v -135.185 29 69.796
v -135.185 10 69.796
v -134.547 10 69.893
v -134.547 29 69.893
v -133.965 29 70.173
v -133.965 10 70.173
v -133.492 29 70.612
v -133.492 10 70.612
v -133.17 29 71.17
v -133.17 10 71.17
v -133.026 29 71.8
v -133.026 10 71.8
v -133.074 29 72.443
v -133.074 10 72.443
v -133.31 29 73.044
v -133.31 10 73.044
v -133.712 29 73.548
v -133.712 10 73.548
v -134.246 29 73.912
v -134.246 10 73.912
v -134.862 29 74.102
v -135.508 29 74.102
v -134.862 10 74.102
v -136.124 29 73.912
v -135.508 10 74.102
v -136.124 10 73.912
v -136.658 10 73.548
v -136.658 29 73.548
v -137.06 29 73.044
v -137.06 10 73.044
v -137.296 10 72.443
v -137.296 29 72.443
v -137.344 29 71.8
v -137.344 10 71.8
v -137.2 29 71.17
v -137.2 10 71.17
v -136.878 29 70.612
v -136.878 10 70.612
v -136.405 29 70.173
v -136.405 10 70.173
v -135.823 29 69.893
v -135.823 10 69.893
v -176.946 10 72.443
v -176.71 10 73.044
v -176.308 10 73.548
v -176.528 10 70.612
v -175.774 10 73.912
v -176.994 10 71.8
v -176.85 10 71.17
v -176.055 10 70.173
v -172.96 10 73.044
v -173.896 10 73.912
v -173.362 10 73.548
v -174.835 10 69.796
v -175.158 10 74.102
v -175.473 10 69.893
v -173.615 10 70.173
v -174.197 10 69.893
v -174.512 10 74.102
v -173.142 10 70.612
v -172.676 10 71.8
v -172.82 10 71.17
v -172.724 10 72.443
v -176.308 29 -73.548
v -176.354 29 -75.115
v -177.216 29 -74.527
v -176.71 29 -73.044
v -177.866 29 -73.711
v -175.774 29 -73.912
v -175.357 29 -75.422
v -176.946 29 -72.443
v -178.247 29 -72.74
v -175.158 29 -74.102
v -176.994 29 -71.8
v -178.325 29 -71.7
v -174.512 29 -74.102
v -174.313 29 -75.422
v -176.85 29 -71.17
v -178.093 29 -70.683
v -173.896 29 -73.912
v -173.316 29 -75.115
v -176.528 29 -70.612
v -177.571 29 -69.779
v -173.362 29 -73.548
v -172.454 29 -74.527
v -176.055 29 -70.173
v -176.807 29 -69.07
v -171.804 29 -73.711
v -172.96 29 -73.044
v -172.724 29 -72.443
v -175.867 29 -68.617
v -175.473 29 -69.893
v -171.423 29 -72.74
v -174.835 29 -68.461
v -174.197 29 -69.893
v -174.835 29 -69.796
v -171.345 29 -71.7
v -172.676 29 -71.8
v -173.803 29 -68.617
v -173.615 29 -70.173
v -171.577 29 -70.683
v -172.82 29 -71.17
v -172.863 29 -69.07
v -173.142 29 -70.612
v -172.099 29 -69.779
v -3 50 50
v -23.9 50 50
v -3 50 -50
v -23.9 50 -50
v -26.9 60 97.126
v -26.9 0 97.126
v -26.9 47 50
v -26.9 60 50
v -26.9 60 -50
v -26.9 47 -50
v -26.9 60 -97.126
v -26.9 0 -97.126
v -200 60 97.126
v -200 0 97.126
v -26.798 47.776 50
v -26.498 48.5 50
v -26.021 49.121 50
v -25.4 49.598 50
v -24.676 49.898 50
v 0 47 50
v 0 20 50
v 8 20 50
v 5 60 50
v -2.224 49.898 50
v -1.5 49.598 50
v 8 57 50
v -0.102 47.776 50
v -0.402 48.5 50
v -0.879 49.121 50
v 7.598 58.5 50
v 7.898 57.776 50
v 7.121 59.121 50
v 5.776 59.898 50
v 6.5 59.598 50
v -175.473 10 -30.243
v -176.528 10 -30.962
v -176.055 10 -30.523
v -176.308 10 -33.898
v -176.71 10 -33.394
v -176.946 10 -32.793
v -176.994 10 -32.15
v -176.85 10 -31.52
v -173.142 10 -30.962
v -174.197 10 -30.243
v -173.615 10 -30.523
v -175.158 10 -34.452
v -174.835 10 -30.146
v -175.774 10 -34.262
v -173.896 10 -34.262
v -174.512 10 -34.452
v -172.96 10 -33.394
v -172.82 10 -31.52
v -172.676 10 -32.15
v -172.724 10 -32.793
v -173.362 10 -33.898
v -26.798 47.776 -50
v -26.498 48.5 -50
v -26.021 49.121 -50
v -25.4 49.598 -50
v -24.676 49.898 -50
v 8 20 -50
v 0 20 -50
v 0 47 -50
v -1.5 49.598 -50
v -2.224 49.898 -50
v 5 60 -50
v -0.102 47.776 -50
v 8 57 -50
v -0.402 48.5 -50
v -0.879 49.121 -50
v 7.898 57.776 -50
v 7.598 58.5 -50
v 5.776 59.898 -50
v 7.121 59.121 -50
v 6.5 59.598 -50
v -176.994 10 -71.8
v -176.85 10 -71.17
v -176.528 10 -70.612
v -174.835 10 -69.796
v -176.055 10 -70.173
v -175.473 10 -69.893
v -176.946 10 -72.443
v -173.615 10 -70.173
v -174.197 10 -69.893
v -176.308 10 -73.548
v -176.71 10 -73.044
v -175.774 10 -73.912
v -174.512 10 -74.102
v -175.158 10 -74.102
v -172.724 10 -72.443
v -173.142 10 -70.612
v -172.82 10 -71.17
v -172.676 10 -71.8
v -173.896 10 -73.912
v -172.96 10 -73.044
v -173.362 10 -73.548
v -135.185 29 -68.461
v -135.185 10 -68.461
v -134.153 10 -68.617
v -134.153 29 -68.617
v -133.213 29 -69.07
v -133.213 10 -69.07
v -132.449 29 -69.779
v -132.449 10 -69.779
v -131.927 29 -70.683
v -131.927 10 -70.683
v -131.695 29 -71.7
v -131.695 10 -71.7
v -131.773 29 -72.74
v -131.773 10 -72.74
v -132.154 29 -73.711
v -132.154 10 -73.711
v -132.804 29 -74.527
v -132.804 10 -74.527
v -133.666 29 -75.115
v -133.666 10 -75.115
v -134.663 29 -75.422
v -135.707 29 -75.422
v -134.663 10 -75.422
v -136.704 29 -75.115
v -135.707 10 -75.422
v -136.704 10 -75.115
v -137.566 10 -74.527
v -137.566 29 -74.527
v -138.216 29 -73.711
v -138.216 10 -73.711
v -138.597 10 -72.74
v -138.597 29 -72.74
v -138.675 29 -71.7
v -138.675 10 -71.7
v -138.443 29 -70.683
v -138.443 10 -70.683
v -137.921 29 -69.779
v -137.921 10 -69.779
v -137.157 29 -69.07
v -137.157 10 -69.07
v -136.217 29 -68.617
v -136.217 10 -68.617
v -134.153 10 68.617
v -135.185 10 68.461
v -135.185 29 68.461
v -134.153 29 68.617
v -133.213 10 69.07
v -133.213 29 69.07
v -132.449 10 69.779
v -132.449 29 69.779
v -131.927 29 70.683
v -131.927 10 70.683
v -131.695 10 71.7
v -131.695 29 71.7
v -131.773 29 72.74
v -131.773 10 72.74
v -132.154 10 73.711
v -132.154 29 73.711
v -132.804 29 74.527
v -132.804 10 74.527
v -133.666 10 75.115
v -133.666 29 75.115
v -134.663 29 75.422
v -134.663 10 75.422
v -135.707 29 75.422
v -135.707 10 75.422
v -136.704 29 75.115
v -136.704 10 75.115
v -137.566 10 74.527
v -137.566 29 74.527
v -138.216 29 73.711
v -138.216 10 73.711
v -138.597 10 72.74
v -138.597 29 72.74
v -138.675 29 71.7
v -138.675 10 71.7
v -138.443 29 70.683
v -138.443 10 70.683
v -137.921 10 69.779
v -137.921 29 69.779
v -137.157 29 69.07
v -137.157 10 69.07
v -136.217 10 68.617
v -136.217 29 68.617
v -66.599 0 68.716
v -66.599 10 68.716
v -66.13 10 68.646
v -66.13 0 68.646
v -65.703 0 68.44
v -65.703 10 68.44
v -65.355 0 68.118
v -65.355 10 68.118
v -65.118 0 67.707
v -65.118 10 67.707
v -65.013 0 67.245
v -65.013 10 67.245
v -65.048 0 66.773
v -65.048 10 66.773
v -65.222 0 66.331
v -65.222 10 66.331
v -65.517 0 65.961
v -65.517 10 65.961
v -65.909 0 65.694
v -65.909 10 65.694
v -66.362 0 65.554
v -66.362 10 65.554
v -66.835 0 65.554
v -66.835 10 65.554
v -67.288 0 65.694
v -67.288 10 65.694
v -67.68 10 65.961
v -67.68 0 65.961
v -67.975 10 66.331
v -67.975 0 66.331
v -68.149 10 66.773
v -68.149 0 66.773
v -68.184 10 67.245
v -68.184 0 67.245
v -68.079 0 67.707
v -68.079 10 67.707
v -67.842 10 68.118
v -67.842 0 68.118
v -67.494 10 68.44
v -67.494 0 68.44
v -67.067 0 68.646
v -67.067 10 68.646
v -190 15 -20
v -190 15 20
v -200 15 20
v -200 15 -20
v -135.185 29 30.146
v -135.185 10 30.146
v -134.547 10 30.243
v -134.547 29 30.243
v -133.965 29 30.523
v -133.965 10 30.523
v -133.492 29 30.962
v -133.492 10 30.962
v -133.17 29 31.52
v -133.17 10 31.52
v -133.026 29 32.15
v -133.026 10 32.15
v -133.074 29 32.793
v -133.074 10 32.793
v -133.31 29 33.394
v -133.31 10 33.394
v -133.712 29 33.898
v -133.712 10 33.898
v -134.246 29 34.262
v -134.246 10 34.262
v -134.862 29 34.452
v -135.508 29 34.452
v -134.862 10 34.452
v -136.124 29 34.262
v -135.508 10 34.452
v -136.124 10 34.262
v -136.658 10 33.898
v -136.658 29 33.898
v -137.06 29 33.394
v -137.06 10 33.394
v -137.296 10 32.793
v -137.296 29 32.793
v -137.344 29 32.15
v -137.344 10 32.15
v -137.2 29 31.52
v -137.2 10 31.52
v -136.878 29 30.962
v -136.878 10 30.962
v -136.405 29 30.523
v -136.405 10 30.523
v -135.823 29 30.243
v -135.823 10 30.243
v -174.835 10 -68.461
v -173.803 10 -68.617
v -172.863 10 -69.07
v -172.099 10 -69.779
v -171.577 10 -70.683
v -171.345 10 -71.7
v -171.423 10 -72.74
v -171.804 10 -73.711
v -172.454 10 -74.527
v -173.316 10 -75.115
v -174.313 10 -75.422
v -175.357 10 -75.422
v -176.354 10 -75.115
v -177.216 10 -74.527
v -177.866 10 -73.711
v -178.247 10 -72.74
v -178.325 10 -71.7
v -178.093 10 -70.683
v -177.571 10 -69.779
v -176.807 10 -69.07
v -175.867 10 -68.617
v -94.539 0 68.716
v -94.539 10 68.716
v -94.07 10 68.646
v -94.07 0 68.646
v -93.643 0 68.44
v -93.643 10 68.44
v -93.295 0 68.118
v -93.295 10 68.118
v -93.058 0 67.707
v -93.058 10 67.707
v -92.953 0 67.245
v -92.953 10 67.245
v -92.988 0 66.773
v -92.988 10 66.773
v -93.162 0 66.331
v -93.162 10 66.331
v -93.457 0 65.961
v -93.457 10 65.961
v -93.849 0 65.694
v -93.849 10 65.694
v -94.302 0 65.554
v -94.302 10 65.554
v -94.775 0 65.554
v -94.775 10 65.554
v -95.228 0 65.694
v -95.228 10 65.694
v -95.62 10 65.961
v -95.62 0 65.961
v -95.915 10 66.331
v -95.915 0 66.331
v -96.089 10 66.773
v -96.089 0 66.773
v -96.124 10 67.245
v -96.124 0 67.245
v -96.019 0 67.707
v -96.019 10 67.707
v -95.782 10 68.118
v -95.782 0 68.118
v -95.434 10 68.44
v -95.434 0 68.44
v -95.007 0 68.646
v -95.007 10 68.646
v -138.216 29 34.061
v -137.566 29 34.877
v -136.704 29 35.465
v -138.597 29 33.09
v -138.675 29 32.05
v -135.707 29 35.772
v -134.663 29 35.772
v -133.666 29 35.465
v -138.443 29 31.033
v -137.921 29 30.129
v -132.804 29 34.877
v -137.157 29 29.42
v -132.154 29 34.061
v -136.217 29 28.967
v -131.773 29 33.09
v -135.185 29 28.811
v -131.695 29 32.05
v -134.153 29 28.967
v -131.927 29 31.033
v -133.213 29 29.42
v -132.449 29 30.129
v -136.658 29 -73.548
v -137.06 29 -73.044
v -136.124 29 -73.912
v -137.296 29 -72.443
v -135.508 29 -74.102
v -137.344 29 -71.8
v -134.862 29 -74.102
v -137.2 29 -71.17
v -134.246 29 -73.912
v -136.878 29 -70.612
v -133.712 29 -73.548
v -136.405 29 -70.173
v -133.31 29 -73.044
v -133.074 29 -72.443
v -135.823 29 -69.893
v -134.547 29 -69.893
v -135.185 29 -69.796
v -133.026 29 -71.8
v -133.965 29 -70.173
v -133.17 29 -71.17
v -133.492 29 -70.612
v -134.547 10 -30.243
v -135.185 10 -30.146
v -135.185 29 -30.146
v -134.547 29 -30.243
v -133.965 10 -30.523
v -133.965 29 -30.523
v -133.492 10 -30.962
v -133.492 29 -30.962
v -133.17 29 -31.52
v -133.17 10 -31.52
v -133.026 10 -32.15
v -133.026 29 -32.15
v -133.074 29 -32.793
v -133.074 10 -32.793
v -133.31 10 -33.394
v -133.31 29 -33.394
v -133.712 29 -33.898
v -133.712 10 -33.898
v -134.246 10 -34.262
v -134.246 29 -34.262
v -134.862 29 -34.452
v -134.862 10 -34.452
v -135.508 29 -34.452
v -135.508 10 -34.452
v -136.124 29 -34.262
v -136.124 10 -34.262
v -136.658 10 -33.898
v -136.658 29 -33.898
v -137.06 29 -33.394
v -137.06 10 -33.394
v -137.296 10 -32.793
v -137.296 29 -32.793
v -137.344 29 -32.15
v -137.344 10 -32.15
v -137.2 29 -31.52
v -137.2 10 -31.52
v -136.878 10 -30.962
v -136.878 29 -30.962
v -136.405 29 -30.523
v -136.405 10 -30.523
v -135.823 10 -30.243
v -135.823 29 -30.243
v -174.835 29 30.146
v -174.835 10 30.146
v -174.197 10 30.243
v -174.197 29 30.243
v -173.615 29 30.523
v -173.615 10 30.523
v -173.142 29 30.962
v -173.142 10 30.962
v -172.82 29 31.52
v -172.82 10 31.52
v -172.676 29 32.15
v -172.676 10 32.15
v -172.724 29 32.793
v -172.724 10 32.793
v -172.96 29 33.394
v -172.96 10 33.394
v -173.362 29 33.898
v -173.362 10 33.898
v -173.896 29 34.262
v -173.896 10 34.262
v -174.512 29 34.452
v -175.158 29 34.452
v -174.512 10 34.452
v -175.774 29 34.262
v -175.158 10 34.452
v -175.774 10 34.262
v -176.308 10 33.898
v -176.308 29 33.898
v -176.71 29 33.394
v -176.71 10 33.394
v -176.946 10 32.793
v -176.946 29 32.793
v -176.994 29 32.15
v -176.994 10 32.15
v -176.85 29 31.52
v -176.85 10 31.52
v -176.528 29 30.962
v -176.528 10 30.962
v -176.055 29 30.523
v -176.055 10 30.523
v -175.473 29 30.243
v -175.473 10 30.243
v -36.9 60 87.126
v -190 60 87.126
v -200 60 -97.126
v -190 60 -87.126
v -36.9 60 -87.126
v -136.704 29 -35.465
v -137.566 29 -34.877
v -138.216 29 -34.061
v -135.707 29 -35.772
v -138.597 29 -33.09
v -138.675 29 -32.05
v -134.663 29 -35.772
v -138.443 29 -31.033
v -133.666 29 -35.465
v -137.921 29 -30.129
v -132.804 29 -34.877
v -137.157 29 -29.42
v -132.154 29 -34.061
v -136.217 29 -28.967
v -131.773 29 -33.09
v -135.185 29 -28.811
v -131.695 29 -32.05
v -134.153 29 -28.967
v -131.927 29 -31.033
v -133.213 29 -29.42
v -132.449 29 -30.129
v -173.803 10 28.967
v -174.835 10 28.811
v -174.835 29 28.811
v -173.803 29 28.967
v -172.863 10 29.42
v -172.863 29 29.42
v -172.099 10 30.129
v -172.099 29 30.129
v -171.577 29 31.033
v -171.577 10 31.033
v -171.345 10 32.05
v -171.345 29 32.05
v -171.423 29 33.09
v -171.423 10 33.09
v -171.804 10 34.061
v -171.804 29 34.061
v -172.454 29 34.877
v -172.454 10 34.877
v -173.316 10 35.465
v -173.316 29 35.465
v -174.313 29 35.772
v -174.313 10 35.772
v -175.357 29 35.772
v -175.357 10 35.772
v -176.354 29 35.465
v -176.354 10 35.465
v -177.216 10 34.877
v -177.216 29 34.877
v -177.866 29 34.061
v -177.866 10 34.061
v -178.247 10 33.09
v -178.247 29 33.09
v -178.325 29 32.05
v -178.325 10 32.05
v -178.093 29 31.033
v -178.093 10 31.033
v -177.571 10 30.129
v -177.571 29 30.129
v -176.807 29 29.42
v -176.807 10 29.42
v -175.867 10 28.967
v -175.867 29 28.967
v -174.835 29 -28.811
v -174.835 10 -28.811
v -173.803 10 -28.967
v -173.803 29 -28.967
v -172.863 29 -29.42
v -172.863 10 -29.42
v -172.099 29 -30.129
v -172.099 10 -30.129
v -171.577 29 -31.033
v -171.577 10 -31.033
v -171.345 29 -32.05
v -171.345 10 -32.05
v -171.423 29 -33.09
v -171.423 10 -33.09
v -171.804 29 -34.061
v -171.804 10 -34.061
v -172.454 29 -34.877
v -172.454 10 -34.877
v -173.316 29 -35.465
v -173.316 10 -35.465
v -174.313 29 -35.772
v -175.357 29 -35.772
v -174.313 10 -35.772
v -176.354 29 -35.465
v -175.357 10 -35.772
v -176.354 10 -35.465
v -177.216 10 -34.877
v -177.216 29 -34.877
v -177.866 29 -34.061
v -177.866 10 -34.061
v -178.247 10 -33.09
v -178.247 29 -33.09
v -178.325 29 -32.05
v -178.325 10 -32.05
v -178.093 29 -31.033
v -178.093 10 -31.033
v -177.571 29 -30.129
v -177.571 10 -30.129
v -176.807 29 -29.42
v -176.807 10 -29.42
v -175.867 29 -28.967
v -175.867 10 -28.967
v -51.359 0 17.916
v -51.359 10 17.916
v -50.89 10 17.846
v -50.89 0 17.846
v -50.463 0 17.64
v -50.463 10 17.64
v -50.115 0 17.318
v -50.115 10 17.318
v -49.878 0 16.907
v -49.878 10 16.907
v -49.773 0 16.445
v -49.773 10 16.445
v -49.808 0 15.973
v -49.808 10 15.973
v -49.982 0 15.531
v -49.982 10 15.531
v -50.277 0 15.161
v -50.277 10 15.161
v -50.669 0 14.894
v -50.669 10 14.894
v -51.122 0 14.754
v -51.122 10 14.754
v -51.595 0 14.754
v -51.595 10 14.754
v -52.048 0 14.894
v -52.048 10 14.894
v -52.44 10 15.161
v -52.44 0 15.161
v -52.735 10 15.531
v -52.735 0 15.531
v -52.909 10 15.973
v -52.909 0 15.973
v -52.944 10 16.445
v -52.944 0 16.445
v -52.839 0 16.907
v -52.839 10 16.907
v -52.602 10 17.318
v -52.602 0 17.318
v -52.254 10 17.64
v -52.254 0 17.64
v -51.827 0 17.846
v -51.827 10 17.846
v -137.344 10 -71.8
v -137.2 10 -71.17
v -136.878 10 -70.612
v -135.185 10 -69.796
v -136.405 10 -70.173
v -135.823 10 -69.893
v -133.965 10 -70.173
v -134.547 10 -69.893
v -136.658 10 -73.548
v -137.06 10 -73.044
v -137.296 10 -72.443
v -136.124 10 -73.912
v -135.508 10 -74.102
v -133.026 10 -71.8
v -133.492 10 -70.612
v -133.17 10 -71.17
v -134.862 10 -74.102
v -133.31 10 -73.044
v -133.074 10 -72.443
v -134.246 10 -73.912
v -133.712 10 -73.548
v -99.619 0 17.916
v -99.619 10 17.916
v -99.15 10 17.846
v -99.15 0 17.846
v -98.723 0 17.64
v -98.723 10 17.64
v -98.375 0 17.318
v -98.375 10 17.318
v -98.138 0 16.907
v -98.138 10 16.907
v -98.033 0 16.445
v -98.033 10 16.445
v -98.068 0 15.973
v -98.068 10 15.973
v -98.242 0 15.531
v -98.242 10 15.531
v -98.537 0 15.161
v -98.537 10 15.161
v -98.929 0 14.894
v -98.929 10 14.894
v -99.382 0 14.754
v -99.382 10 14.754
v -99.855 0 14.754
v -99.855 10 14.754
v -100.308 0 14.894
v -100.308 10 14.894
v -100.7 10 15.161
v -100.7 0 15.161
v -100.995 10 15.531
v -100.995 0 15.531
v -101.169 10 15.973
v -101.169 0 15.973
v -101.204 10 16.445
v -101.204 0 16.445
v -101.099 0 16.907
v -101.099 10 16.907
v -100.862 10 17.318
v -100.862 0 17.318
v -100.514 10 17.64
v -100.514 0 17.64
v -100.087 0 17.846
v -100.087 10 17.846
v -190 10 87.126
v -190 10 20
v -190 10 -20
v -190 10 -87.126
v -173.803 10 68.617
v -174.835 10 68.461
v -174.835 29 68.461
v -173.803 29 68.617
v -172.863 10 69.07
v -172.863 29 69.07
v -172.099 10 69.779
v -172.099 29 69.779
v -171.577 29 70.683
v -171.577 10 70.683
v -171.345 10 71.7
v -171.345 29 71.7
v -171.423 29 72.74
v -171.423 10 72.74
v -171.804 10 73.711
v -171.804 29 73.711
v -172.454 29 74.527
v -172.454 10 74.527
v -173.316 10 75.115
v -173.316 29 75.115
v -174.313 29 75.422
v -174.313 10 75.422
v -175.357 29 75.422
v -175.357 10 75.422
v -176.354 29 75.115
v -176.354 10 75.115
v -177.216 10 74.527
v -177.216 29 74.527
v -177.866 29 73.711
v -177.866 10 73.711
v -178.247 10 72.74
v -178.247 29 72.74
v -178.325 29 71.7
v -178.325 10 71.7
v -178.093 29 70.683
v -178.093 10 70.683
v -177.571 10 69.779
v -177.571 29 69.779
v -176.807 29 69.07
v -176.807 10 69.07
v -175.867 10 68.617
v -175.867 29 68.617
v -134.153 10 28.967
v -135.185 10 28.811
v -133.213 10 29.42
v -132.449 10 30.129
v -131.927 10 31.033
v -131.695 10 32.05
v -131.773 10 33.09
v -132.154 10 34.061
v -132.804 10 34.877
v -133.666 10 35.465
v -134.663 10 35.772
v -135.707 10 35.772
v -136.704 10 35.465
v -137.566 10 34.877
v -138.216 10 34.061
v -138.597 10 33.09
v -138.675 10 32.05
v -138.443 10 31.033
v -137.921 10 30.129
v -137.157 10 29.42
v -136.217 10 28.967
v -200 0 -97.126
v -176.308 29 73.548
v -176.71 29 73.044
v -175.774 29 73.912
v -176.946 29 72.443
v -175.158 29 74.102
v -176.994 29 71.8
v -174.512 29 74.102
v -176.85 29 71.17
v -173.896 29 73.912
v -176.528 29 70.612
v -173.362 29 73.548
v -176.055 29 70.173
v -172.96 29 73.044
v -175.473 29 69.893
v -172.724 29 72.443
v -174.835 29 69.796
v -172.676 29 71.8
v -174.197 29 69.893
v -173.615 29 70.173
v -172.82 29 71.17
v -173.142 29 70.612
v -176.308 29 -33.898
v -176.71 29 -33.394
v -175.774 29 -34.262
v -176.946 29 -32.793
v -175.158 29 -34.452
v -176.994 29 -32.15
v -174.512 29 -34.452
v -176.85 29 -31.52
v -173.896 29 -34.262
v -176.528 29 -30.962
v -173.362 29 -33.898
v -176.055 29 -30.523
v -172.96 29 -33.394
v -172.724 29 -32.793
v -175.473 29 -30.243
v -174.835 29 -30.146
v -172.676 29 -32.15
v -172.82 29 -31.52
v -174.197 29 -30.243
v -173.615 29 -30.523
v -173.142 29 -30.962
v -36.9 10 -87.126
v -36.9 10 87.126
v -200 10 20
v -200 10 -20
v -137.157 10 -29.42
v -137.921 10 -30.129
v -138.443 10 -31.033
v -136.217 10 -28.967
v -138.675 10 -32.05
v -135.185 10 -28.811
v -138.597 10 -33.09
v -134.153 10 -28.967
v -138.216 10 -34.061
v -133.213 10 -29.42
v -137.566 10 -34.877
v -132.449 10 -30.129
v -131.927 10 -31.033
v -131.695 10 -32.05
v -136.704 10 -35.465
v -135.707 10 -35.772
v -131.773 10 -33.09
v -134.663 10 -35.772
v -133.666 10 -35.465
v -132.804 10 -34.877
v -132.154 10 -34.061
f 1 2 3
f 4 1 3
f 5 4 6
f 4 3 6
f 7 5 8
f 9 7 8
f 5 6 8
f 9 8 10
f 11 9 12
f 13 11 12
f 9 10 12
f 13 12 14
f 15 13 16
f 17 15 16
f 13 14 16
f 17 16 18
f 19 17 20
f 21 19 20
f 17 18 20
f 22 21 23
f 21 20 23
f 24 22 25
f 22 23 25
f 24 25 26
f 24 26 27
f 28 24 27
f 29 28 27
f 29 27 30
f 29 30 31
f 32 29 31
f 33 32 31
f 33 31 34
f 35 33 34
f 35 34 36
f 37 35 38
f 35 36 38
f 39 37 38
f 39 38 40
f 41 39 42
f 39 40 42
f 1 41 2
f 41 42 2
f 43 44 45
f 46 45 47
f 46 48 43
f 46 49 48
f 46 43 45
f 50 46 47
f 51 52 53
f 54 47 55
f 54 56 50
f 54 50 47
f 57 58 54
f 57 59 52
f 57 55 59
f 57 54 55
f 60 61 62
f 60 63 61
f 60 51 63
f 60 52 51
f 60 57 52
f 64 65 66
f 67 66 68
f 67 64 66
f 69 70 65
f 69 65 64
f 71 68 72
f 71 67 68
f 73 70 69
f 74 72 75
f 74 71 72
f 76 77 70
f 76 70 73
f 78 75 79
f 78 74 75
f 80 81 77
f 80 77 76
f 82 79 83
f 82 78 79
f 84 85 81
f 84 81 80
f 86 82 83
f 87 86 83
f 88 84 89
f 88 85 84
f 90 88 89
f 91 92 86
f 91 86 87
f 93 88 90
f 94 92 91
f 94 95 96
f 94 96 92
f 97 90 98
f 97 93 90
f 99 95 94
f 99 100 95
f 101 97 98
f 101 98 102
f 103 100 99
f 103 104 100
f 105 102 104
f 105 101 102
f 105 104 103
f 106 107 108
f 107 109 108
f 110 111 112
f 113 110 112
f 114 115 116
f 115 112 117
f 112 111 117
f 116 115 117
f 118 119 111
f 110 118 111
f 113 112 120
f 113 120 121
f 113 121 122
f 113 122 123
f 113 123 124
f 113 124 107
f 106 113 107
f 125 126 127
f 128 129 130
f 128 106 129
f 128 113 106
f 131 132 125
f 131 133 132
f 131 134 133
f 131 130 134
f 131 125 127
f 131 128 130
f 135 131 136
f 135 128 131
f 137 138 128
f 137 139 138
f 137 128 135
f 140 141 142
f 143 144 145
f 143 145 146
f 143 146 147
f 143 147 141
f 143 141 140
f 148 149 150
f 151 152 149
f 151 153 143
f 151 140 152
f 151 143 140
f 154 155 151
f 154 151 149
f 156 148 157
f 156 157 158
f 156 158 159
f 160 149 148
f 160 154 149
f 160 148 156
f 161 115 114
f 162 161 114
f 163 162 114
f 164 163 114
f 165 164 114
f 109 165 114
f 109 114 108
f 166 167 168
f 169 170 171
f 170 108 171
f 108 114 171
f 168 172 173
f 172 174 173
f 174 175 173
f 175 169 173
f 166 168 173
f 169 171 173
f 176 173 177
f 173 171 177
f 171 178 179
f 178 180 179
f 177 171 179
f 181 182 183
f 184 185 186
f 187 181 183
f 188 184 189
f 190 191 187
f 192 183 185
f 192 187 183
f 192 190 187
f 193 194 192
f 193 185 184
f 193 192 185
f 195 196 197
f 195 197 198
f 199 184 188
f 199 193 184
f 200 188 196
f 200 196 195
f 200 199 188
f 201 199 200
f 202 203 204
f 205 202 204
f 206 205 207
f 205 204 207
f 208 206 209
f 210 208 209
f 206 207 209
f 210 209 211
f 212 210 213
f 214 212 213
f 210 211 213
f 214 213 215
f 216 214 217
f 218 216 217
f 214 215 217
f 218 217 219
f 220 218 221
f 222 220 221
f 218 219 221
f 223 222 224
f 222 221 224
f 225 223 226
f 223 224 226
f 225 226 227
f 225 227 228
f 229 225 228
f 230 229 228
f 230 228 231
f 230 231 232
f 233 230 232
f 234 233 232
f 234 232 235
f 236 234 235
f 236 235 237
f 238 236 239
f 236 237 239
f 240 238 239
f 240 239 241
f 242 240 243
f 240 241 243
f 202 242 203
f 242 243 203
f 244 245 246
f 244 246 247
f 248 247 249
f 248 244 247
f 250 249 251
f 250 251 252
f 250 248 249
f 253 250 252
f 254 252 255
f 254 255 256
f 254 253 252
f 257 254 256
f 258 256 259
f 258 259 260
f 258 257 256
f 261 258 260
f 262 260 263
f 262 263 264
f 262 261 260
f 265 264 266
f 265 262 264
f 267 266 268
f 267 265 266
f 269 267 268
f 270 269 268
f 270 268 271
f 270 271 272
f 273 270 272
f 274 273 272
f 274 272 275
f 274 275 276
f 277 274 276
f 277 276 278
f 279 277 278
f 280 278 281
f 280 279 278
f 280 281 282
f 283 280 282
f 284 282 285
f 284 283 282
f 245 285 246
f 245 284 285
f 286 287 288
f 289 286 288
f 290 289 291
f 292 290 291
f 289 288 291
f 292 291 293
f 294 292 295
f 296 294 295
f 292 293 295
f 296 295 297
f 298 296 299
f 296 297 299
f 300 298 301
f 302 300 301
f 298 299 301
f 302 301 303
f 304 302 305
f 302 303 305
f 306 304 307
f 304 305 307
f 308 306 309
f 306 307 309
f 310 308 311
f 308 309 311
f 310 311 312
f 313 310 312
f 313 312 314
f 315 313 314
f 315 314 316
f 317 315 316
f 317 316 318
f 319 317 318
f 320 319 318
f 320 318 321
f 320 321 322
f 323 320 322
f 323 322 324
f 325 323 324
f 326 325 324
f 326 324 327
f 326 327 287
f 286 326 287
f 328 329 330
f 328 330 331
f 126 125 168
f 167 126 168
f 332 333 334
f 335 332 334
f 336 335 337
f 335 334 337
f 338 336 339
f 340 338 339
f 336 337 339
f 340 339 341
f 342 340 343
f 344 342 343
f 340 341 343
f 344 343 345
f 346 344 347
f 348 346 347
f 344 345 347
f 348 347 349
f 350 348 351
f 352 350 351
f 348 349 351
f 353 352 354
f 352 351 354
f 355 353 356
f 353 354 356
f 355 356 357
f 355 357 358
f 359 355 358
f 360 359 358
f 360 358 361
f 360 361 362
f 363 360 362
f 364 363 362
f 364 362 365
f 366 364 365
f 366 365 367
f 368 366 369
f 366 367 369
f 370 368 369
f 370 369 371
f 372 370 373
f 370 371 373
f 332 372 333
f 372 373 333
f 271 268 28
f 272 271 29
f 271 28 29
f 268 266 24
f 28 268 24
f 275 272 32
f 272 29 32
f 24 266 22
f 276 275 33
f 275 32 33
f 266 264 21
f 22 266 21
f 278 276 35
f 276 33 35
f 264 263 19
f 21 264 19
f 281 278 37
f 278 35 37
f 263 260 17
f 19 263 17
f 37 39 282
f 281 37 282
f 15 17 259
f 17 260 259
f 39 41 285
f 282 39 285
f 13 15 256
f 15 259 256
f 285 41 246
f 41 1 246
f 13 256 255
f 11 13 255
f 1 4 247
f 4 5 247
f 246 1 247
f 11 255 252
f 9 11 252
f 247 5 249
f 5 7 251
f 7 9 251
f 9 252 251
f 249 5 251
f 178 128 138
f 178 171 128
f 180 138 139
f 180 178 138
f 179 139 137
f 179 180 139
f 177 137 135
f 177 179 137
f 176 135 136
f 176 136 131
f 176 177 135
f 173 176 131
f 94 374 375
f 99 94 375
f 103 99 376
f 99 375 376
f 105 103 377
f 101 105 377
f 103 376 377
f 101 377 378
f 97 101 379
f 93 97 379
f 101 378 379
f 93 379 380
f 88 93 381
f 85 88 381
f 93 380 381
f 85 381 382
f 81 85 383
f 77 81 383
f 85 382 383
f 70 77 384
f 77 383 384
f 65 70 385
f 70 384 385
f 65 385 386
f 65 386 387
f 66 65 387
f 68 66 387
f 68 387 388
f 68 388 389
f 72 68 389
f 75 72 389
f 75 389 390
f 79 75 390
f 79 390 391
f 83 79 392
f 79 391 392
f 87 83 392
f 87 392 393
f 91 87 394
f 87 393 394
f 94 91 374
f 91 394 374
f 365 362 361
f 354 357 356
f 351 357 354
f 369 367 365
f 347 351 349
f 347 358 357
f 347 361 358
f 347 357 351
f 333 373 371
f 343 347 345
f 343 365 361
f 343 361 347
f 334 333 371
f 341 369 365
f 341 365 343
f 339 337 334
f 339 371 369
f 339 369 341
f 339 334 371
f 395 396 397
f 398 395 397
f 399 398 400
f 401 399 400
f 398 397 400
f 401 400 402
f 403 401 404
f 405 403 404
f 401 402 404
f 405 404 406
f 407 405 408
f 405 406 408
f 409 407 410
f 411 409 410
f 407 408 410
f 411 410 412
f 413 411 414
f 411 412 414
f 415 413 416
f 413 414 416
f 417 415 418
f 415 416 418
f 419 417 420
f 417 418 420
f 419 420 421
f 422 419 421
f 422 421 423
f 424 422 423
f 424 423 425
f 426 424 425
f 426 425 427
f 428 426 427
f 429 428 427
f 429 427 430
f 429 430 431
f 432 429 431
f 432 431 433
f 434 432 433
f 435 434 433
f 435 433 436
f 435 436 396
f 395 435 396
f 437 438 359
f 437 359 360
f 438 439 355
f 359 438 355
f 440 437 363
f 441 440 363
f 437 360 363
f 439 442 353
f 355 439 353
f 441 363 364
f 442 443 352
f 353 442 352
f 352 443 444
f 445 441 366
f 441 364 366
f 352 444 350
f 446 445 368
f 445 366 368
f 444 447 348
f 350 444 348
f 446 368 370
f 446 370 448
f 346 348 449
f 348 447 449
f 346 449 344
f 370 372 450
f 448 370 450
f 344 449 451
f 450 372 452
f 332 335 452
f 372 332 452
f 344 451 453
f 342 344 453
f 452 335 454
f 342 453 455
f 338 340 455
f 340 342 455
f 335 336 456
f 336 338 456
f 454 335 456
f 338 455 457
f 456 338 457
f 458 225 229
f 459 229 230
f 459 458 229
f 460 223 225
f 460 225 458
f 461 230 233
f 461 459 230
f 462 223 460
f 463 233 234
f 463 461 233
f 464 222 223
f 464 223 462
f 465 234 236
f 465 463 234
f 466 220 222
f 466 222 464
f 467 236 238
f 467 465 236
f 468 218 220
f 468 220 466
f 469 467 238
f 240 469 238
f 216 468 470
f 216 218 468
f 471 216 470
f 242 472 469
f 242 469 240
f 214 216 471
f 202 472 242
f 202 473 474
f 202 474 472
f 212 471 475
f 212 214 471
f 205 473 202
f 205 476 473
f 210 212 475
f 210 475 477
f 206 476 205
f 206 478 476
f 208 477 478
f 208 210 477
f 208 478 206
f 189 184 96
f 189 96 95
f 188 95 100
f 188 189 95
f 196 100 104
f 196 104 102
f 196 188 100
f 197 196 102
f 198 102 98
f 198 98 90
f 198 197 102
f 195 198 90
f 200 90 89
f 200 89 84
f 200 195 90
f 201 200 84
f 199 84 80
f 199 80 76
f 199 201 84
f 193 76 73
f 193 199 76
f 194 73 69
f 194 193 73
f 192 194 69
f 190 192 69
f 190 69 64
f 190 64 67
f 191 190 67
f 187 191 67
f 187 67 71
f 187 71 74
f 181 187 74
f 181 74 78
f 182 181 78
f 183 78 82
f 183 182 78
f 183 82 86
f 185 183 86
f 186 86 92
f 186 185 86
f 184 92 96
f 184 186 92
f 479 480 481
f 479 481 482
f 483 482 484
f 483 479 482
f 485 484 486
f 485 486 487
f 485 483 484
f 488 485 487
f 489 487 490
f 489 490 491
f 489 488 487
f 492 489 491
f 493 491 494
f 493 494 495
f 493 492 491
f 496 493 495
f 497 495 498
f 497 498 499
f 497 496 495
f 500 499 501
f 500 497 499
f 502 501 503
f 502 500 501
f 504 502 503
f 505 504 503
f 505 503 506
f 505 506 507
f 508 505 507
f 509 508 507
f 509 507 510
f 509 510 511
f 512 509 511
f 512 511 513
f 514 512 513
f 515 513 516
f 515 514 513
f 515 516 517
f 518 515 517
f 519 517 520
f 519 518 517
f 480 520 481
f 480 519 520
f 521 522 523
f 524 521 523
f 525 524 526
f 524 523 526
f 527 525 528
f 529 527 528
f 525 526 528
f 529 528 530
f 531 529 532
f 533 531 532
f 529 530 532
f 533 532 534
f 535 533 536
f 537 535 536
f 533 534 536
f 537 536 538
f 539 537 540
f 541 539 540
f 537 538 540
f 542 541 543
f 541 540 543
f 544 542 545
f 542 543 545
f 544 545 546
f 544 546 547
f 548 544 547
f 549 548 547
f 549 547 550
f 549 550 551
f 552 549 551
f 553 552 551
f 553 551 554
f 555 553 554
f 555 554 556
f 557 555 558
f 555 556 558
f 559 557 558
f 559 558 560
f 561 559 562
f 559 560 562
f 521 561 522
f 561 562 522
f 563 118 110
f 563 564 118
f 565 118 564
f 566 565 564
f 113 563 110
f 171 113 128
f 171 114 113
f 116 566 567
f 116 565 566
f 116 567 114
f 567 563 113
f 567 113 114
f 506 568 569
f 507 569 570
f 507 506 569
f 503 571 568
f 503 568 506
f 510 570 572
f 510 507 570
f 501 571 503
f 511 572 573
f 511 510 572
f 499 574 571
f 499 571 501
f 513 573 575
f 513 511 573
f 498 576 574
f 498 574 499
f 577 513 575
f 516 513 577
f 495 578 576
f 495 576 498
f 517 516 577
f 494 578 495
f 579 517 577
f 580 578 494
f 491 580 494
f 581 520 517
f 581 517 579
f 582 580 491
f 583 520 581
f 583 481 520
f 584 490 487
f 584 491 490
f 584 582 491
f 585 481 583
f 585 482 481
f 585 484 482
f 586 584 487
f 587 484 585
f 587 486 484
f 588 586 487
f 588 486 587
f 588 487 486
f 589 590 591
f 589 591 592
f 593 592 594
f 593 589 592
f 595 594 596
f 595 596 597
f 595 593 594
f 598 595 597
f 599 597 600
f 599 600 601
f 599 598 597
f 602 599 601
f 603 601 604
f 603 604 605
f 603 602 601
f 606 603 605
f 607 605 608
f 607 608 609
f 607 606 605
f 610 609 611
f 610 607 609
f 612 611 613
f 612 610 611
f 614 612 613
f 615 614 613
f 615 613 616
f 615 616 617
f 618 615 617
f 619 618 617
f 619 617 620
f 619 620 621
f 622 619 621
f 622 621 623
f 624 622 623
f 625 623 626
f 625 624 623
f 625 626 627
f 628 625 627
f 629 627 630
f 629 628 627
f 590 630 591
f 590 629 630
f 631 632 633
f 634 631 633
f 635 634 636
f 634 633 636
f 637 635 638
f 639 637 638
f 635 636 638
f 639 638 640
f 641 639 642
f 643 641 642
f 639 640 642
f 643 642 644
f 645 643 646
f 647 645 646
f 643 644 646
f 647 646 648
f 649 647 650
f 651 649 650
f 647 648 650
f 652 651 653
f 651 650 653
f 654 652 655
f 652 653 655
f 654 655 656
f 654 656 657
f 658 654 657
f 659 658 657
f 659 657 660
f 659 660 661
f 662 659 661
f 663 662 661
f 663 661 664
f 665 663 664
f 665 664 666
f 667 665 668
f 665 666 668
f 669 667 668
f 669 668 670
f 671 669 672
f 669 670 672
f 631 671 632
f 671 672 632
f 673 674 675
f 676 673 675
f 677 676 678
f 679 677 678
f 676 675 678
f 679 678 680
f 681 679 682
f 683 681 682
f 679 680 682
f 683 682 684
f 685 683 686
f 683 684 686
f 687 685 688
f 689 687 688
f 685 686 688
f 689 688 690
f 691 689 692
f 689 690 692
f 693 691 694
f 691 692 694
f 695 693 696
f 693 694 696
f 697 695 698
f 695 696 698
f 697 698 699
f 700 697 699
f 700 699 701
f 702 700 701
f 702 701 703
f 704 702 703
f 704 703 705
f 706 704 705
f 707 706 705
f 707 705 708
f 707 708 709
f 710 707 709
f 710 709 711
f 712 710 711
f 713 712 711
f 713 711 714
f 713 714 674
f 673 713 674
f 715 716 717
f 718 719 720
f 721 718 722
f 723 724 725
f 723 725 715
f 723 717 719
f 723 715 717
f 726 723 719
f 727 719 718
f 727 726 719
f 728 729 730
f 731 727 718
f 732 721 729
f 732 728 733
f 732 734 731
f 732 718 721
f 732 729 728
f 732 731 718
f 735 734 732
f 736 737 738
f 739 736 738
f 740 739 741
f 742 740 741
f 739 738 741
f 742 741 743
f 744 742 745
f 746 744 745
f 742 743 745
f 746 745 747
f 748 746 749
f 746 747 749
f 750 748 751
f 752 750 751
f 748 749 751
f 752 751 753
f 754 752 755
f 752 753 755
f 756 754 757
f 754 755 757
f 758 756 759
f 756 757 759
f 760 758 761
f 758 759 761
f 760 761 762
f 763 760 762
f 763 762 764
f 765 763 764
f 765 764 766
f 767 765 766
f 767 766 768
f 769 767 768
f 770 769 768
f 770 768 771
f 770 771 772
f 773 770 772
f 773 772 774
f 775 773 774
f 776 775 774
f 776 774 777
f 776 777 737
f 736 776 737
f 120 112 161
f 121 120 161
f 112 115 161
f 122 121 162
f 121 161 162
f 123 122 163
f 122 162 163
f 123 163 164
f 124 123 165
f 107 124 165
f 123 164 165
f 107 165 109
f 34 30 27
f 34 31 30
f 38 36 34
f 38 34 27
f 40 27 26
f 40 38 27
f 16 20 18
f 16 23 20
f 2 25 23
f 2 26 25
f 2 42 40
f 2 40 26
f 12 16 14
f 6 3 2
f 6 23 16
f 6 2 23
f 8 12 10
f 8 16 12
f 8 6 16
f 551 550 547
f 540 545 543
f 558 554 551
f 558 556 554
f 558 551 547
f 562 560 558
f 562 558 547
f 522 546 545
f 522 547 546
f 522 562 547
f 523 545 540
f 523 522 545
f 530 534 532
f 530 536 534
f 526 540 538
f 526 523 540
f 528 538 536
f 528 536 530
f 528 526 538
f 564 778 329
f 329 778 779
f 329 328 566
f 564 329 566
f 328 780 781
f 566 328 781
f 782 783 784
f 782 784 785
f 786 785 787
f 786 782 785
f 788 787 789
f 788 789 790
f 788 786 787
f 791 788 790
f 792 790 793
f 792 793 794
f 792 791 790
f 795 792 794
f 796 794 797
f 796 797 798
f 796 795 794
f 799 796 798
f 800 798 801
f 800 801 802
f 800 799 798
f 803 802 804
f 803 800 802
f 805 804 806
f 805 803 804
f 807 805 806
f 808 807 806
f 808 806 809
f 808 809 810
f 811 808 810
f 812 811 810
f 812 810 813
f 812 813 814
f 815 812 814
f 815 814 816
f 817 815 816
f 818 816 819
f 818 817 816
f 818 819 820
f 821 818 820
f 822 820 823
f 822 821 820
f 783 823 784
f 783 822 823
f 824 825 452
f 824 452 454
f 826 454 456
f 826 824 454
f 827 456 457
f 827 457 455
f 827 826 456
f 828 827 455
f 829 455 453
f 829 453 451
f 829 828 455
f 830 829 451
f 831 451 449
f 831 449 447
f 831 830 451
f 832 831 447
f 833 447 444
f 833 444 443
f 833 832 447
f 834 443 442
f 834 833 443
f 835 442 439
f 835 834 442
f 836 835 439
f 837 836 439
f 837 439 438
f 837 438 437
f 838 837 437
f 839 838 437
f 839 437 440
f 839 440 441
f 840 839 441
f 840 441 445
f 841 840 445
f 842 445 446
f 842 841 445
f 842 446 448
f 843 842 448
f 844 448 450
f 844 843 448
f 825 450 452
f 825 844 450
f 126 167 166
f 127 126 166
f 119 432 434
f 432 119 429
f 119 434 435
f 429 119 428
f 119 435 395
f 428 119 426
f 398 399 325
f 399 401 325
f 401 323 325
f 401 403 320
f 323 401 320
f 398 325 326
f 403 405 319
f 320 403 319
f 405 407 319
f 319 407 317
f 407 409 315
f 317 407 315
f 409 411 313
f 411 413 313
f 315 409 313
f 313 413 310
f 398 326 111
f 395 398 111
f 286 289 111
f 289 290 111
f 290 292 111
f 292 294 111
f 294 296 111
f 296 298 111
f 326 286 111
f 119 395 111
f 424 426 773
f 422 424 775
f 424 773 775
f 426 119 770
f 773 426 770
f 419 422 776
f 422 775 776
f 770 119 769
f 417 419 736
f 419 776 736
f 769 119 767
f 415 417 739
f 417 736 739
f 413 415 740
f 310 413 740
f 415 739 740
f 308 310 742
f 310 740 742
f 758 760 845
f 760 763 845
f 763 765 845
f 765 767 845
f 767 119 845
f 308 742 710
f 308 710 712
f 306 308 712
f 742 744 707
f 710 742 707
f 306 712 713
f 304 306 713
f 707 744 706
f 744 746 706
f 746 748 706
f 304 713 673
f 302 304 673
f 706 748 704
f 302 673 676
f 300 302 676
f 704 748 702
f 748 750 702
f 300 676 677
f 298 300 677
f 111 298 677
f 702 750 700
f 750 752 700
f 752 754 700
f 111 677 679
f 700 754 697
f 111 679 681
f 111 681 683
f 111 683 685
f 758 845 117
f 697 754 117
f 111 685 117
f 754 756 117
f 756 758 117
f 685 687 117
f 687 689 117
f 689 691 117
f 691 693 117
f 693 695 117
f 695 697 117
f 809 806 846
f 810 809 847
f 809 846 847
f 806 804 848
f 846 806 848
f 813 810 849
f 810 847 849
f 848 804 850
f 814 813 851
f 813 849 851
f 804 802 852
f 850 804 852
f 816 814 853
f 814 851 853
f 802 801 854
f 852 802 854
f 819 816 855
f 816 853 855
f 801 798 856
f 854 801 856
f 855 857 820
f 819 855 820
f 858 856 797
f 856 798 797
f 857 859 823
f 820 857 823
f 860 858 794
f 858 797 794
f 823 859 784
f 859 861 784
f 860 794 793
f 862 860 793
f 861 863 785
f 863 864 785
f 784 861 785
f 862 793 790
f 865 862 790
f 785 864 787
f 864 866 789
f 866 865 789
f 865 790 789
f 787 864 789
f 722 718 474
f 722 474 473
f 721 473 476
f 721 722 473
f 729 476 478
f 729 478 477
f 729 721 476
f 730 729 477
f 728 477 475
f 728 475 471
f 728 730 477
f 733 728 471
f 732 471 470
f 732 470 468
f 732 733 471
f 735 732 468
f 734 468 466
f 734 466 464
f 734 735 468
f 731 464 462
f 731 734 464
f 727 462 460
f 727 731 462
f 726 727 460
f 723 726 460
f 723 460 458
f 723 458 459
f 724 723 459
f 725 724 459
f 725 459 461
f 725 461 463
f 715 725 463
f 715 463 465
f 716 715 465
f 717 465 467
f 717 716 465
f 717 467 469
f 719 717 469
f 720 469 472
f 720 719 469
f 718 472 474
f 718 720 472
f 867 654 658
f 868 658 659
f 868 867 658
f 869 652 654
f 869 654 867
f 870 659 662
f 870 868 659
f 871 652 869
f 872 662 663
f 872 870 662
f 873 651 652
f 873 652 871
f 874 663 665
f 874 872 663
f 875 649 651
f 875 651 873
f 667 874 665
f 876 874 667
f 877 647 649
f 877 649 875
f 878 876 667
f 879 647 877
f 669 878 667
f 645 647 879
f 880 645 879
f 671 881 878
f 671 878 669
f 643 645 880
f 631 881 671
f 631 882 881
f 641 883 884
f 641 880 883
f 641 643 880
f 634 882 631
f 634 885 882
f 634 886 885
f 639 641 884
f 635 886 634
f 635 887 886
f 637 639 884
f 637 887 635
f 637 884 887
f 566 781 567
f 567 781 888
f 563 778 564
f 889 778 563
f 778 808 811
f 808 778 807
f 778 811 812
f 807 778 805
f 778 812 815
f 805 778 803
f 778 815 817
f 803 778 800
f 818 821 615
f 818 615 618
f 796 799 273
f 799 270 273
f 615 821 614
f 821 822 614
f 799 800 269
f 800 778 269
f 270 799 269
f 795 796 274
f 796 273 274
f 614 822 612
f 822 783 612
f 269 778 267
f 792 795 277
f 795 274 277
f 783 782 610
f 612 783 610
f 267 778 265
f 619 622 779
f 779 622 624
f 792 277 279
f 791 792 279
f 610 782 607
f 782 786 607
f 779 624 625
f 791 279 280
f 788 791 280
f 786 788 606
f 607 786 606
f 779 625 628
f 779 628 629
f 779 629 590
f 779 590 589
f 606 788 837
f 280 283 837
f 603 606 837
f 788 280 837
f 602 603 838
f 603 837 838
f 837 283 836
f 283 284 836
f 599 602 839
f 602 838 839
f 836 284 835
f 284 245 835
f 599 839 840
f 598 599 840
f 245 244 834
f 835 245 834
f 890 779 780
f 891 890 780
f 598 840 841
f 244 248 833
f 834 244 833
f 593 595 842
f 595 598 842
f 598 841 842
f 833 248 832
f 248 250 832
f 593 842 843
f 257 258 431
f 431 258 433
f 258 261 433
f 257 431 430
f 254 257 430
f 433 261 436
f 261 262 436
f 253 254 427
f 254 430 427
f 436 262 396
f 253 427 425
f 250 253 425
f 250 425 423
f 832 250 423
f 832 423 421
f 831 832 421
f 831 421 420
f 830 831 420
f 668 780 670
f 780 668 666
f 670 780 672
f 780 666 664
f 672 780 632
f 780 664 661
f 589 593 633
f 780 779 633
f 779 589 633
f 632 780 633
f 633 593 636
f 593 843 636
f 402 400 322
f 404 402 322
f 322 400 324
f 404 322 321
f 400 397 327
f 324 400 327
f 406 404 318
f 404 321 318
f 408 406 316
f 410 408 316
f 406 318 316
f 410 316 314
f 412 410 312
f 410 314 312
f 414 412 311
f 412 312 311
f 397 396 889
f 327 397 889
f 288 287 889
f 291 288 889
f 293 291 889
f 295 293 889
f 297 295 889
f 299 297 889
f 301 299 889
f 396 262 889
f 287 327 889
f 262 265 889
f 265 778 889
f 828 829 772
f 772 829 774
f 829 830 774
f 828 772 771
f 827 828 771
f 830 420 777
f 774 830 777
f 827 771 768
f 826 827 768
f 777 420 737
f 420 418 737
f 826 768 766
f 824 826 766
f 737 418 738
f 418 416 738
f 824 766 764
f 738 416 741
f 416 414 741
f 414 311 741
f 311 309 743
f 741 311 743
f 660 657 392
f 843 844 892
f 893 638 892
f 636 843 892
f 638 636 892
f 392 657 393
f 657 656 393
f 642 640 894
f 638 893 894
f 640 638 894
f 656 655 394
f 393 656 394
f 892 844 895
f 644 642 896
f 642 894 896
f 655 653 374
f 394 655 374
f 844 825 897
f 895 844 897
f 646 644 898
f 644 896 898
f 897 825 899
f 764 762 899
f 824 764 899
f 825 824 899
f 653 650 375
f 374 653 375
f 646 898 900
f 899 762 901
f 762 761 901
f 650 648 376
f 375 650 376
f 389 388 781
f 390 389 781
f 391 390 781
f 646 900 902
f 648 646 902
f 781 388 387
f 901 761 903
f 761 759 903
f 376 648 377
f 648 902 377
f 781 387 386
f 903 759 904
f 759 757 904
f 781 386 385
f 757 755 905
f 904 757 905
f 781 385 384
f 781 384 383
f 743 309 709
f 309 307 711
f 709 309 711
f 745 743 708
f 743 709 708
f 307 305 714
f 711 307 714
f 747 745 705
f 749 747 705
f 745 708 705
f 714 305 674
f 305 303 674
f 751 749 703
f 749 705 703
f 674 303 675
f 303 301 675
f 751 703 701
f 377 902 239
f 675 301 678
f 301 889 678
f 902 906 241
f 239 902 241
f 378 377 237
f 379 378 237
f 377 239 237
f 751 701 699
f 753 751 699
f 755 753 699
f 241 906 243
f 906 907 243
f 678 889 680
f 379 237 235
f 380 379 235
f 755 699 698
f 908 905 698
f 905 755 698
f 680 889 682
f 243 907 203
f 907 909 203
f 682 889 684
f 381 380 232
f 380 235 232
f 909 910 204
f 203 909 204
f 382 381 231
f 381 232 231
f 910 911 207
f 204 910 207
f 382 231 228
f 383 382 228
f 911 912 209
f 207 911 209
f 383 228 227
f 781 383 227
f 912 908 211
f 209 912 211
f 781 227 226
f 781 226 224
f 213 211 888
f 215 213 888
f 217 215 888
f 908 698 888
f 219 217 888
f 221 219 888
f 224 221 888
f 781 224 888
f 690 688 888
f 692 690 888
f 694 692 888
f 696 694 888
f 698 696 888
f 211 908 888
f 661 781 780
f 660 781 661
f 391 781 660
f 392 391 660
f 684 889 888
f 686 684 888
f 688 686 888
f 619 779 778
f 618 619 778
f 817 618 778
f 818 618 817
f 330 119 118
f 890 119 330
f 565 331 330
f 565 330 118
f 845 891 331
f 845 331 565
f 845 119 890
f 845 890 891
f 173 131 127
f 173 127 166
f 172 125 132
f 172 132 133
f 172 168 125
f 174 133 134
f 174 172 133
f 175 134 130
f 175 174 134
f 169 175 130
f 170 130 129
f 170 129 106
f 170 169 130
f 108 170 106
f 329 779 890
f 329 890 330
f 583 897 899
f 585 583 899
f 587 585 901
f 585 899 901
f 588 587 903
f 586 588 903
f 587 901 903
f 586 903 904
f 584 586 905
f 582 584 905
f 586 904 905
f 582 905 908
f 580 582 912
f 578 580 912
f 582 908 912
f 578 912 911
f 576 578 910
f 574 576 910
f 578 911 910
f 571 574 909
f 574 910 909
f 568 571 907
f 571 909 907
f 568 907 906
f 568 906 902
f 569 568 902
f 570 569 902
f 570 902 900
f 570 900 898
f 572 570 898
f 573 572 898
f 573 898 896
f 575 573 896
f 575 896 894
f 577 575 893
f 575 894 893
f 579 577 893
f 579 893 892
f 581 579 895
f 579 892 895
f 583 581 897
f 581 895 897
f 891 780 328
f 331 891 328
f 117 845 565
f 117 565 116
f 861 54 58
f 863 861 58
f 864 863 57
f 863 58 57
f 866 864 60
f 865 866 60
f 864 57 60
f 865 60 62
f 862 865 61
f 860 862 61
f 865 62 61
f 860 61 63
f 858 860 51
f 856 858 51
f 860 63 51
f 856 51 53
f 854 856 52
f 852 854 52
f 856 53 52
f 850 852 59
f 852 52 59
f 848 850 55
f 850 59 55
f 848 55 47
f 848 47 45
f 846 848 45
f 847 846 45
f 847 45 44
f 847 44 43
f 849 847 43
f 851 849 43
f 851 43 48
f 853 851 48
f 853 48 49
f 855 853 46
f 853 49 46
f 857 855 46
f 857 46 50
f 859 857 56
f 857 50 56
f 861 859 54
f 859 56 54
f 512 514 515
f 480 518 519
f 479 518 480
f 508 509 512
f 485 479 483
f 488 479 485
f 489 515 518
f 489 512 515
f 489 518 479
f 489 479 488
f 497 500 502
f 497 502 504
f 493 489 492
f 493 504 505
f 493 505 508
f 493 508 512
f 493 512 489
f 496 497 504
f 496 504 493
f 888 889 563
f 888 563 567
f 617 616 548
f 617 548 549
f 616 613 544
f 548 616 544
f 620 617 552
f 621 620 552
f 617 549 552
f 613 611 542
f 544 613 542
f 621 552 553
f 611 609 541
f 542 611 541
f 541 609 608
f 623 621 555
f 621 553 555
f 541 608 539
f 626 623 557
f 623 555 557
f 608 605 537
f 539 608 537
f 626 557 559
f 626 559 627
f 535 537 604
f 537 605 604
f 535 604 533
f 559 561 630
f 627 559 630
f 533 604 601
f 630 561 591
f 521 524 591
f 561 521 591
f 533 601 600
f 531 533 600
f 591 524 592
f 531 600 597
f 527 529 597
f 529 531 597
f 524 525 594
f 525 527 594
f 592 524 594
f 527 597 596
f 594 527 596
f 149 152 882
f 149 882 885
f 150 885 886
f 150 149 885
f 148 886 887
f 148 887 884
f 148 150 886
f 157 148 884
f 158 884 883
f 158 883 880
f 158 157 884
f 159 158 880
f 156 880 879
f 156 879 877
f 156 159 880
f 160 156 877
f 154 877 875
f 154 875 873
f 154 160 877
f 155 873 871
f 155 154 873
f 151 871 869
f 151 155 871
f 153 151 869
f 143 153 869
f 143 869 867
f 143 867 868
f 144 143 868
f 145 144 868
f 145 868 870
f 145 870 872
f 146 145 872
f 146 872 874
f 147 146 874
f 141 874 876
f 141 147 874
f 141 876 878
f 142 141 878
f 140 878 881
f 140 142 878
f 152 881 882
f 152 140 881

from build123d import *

# Parameters (mm, degrees)
CROQUIS1_W              = 173.1
CROQUIS1_H              = 194.252873564
SALIENTE_EXTRUIR1_DEPTH = 60
VACIADO1_T              = -10
CROQUIS2_R              = 3.5
CROQUIS2_R_2            = 2.165
SALIENTE_EXTRUIR2_DEPTH = 19
CROQUIS3_R              = 1.59
CROQUIS3_R_2            = 1.5875
CORTAR_EXTRUIR1_DEPTH   = 19
CROQUIS5_W              = 40
CROQUIS5_H              = 5
CORTAR_EXTRUIR2_DEPTH   = 19
CROQUIS6_W              = 26.9
CROQUIS6_H              = 100
SALIENTE_EXTRUIR3_DEPTH = 10
CROQUIS7_W              = 8
CROQUIS7_H              = 100
SALIENTE_EXTRUIR4_DEPTH = 40
REDONDEO1_R             = 3
REDONDEO2_R             = 3


with BuildPart() as part:
    # Croquis1 → Saliente-Extruir1 (new body)
    with BuildSketch(Plane(origin=(0, 0, 0), x_dir=(1, 0, 0), z_dir=(0, 1, 0))):
        with Locations((-113.45, 0)):
            Rectangle(CROQUIS1_W, CROQUIS1_H)
    extrude(amount=SALIENTE_EXTRUIR1_DEPTH)

    # Vaciado1
    vaciado1_openings = [part.faces().sort_by_distance(p)[0] for p in [
        (-113.45, 60, 0),
    ]]
    offset(amount=VACIADO1_T, openings=vaciado1_openings, kind=Kind.INTERSECTION)

    # Croquis2 → Saliente-Extruir2 (add)
    # profile 1 of 4: a face of its own
    with BuildSketch(Plane(origin=(0, 10, 0), x_dir=(1, 0, 0), z_dir=(0, 1, 0))):
        with Locations(Location((-135.185, 32.311436782, 0), (0, 0, 270))):
            Circle(CROQUIS2_R)
        with Locations(Location((-135.185, 32.311436782, 0), (0, 0, 270))):
            Circle(CROQUIS2_R_2, mode=Mode.SUBTRACT)
    # profile 2 of 4: a face of its own
    with BuildSketch(Plane(origin=(0, 10, 0), x_dir=(1, 0, 0), z_dir=(0, 1, 0))):
        with Locations(Location((-174.835, 32.311436782, 0), (0, 0, 270))):
            Circle(CROQUIS2_R)
        with Locations(Location((-174.835, 32.311436782, 0), (0, 0, 270))):
            Circle(CROQUIS2_R_2, mode=Mode.SUBTRACT)
    # profile 3 of 4: a face of its own
    with BuildSketch(Plane(origin=(0, 10, 0), x_dir=(1, 0, 0), z_dir=(0, 1, 0))):
        with Locations(Location((-174.835, 71.961436782, 0), (0, 0, 270))):
            Circle(CROQUIS2_R)
        with Locations(Location((-174.835, 71.961436782, 0), (0, 0, 270))):
            Circle(CROQUIS2_R_2, mode=Mode.SUBTRACT)
    # profile 4 of 4: a face of its own
    with BuildSketch(Plane(origin=(0, 10, 0), x_dir=(1, 0, 0), z_dir=(0, 1, 0))):
        with Locations(Location((-135.185, 71.961436782, 0), (0, 0, 270))):
            Circle(CROQUIS2_R)
        with Locations(Location((-135.185, 71.961436782, 0), (0, 0, 270))):
            Circle(CROQUIS2_R_2, mode=Mode.SUBTRACT)
    saliente_extruir2 = extrude(amount=SALIENTE_EXTRUIR2_DEPTH)

    # Simetría1: Saliente-Extruir2 across plane
    add(saliente_extruir2.mirror(Plane.XY))

    # Croquis3 → Cortar-Extruir1 (cut)
    # profile 1 of 5: a face of its own
    with BuildSketch(Plane(origin=(0, 10, 0), x_dir=(1, 0, 0), z_dir=(0, 1, 0))):
        with Locations(Location((-99.618504427, -16.326436782, 0), (0, 0, 270))):
            Circle(CROQUIS3_R)
    # profile 2 of 5: a face of its own
    with BuildSketch(Plane(origin=(0, 10, 0), x_dir=(1, 0, 0), z_dir=(0, 1, 0))):
        with Locations(Location((-51.358504427, -16.326436782, 0), (0, 0, 270))):
            Circle(CROQUIS3_R)
    # profile 3 of 5: a face of its own
    with BuildSketch(Plane(origin=(0, 10, 0), x_dir=(1, 0, 0), z_dir=(0, 1, 0))):
        with Locations(Location((-94.538504427, -67.126436782, 0), (0, 0, 270))):
            Circle(CROQUIS3_R)
    # profile 4 of 5: a face of its own
    with BuildSketch(Plane(origin=(0, 10, 0), x_dir=(1, 0, 0), z_dir=(0, 1, 0))):
        with Locations(Location((-66.598504427, -67.126436782, 0), (0, 0, 270))):
            Circle(CROQUIS3_R)
    # profile 5 of 5: a face of its own
    with BuildSketch(Plane(origin=(0, 10, 0), x_dir=(1, 0, 0), z_dir=(0, 1, 0))):
        Polygon((12.20327424, 3.574424869), (9.66327424, 1.034424869), (-3.29072576, 1.034424869), (-3.29072576, -65.005575131), (50.04927424, -65.005575131), (50.04927424, 1.034424869), (47.50927424, 1.034424869), (44.96927424, 3.574424869), align=None)
        with Locations((14.48927424, 1.034424869)):
            Circle(CROQUIS3_R_2, mode=Mode.SUBTRACT)
        with Locations((42.42927424, 1.034424869)):
            Circle(CROQUIS3_R_2, mode=Mode.SUBTRACT)
        with Locations((47.50927424, -51.035575131)):
            Circle(CROQUIS3_R_2, mode=Mode.SUBTRACT)
        with Locations((-0.75072576, -49.765575131)):
            Circle(CROQUIS3_R_2, mode=Mode.SUBTRACT)
    extrude(amount=-CORTAR_EXTRUIR1_DEPTH, mode=Mode.SUBTRACT)

    # Croquis5 → Cortar-Extruir2 (cut)
    with BuildSketch(Plane(origin=(-190, 0, 0), x_dir=(0, 0, -1), z_dir=(1, 0, 0))):
        with Locations((0, 12.5)):
            Rectangle(CROQUIS5_W, CROQUIS5_H)
    extrude(amount=-CORTAR_EXTRUIR2_DEPTH, mode=Mode.SUBTRACT)

    # Croquis6 → Saliente-Extruir3 (add)
    with BuildSketch(Plane(origin=(0, 60, 0), x_dir=(1, 0, 0), z_dir=(0, 1, 0))):
        with Locations((-13.45, 0)):
            Rectangle(CROQUIS6_W, CROQUIS6_H)
    extrude(amount=-SALIENTE_EXTRUIR3_DEPTH)

    # Croquis7 → Saliente-Extruir4 (add)
    with BuildSketch(Plane(origin=(0, 60, 0), x_dir=(1, 0, 0), z_dir=(0, 1, 0))):
        with Locations((4, 0)):
            Rectangle(CROQUIS7_W, CROQUIS7_H)
    extrude(amount=-SALIENTE_EXTRUIR4_DEPTH)

    # Redondeo1
    redondeo1_edges = [part.edges().sort_by_distance(p)[0] for p in [
        (-26.9, 50, 0),
        (0, 50, 0),
    ]]
    fillet(redondeo1_edges, radius=REDONDEO1_R)

    # Redondeo2
    redondeo2_edges = [part.edges().sort_by_distance(p)[0] for p in [
        (8, 60, 0),
    ]]
    fillet(redondeo2_edges, radius=REDONDEO2_R)


solid = part.part
